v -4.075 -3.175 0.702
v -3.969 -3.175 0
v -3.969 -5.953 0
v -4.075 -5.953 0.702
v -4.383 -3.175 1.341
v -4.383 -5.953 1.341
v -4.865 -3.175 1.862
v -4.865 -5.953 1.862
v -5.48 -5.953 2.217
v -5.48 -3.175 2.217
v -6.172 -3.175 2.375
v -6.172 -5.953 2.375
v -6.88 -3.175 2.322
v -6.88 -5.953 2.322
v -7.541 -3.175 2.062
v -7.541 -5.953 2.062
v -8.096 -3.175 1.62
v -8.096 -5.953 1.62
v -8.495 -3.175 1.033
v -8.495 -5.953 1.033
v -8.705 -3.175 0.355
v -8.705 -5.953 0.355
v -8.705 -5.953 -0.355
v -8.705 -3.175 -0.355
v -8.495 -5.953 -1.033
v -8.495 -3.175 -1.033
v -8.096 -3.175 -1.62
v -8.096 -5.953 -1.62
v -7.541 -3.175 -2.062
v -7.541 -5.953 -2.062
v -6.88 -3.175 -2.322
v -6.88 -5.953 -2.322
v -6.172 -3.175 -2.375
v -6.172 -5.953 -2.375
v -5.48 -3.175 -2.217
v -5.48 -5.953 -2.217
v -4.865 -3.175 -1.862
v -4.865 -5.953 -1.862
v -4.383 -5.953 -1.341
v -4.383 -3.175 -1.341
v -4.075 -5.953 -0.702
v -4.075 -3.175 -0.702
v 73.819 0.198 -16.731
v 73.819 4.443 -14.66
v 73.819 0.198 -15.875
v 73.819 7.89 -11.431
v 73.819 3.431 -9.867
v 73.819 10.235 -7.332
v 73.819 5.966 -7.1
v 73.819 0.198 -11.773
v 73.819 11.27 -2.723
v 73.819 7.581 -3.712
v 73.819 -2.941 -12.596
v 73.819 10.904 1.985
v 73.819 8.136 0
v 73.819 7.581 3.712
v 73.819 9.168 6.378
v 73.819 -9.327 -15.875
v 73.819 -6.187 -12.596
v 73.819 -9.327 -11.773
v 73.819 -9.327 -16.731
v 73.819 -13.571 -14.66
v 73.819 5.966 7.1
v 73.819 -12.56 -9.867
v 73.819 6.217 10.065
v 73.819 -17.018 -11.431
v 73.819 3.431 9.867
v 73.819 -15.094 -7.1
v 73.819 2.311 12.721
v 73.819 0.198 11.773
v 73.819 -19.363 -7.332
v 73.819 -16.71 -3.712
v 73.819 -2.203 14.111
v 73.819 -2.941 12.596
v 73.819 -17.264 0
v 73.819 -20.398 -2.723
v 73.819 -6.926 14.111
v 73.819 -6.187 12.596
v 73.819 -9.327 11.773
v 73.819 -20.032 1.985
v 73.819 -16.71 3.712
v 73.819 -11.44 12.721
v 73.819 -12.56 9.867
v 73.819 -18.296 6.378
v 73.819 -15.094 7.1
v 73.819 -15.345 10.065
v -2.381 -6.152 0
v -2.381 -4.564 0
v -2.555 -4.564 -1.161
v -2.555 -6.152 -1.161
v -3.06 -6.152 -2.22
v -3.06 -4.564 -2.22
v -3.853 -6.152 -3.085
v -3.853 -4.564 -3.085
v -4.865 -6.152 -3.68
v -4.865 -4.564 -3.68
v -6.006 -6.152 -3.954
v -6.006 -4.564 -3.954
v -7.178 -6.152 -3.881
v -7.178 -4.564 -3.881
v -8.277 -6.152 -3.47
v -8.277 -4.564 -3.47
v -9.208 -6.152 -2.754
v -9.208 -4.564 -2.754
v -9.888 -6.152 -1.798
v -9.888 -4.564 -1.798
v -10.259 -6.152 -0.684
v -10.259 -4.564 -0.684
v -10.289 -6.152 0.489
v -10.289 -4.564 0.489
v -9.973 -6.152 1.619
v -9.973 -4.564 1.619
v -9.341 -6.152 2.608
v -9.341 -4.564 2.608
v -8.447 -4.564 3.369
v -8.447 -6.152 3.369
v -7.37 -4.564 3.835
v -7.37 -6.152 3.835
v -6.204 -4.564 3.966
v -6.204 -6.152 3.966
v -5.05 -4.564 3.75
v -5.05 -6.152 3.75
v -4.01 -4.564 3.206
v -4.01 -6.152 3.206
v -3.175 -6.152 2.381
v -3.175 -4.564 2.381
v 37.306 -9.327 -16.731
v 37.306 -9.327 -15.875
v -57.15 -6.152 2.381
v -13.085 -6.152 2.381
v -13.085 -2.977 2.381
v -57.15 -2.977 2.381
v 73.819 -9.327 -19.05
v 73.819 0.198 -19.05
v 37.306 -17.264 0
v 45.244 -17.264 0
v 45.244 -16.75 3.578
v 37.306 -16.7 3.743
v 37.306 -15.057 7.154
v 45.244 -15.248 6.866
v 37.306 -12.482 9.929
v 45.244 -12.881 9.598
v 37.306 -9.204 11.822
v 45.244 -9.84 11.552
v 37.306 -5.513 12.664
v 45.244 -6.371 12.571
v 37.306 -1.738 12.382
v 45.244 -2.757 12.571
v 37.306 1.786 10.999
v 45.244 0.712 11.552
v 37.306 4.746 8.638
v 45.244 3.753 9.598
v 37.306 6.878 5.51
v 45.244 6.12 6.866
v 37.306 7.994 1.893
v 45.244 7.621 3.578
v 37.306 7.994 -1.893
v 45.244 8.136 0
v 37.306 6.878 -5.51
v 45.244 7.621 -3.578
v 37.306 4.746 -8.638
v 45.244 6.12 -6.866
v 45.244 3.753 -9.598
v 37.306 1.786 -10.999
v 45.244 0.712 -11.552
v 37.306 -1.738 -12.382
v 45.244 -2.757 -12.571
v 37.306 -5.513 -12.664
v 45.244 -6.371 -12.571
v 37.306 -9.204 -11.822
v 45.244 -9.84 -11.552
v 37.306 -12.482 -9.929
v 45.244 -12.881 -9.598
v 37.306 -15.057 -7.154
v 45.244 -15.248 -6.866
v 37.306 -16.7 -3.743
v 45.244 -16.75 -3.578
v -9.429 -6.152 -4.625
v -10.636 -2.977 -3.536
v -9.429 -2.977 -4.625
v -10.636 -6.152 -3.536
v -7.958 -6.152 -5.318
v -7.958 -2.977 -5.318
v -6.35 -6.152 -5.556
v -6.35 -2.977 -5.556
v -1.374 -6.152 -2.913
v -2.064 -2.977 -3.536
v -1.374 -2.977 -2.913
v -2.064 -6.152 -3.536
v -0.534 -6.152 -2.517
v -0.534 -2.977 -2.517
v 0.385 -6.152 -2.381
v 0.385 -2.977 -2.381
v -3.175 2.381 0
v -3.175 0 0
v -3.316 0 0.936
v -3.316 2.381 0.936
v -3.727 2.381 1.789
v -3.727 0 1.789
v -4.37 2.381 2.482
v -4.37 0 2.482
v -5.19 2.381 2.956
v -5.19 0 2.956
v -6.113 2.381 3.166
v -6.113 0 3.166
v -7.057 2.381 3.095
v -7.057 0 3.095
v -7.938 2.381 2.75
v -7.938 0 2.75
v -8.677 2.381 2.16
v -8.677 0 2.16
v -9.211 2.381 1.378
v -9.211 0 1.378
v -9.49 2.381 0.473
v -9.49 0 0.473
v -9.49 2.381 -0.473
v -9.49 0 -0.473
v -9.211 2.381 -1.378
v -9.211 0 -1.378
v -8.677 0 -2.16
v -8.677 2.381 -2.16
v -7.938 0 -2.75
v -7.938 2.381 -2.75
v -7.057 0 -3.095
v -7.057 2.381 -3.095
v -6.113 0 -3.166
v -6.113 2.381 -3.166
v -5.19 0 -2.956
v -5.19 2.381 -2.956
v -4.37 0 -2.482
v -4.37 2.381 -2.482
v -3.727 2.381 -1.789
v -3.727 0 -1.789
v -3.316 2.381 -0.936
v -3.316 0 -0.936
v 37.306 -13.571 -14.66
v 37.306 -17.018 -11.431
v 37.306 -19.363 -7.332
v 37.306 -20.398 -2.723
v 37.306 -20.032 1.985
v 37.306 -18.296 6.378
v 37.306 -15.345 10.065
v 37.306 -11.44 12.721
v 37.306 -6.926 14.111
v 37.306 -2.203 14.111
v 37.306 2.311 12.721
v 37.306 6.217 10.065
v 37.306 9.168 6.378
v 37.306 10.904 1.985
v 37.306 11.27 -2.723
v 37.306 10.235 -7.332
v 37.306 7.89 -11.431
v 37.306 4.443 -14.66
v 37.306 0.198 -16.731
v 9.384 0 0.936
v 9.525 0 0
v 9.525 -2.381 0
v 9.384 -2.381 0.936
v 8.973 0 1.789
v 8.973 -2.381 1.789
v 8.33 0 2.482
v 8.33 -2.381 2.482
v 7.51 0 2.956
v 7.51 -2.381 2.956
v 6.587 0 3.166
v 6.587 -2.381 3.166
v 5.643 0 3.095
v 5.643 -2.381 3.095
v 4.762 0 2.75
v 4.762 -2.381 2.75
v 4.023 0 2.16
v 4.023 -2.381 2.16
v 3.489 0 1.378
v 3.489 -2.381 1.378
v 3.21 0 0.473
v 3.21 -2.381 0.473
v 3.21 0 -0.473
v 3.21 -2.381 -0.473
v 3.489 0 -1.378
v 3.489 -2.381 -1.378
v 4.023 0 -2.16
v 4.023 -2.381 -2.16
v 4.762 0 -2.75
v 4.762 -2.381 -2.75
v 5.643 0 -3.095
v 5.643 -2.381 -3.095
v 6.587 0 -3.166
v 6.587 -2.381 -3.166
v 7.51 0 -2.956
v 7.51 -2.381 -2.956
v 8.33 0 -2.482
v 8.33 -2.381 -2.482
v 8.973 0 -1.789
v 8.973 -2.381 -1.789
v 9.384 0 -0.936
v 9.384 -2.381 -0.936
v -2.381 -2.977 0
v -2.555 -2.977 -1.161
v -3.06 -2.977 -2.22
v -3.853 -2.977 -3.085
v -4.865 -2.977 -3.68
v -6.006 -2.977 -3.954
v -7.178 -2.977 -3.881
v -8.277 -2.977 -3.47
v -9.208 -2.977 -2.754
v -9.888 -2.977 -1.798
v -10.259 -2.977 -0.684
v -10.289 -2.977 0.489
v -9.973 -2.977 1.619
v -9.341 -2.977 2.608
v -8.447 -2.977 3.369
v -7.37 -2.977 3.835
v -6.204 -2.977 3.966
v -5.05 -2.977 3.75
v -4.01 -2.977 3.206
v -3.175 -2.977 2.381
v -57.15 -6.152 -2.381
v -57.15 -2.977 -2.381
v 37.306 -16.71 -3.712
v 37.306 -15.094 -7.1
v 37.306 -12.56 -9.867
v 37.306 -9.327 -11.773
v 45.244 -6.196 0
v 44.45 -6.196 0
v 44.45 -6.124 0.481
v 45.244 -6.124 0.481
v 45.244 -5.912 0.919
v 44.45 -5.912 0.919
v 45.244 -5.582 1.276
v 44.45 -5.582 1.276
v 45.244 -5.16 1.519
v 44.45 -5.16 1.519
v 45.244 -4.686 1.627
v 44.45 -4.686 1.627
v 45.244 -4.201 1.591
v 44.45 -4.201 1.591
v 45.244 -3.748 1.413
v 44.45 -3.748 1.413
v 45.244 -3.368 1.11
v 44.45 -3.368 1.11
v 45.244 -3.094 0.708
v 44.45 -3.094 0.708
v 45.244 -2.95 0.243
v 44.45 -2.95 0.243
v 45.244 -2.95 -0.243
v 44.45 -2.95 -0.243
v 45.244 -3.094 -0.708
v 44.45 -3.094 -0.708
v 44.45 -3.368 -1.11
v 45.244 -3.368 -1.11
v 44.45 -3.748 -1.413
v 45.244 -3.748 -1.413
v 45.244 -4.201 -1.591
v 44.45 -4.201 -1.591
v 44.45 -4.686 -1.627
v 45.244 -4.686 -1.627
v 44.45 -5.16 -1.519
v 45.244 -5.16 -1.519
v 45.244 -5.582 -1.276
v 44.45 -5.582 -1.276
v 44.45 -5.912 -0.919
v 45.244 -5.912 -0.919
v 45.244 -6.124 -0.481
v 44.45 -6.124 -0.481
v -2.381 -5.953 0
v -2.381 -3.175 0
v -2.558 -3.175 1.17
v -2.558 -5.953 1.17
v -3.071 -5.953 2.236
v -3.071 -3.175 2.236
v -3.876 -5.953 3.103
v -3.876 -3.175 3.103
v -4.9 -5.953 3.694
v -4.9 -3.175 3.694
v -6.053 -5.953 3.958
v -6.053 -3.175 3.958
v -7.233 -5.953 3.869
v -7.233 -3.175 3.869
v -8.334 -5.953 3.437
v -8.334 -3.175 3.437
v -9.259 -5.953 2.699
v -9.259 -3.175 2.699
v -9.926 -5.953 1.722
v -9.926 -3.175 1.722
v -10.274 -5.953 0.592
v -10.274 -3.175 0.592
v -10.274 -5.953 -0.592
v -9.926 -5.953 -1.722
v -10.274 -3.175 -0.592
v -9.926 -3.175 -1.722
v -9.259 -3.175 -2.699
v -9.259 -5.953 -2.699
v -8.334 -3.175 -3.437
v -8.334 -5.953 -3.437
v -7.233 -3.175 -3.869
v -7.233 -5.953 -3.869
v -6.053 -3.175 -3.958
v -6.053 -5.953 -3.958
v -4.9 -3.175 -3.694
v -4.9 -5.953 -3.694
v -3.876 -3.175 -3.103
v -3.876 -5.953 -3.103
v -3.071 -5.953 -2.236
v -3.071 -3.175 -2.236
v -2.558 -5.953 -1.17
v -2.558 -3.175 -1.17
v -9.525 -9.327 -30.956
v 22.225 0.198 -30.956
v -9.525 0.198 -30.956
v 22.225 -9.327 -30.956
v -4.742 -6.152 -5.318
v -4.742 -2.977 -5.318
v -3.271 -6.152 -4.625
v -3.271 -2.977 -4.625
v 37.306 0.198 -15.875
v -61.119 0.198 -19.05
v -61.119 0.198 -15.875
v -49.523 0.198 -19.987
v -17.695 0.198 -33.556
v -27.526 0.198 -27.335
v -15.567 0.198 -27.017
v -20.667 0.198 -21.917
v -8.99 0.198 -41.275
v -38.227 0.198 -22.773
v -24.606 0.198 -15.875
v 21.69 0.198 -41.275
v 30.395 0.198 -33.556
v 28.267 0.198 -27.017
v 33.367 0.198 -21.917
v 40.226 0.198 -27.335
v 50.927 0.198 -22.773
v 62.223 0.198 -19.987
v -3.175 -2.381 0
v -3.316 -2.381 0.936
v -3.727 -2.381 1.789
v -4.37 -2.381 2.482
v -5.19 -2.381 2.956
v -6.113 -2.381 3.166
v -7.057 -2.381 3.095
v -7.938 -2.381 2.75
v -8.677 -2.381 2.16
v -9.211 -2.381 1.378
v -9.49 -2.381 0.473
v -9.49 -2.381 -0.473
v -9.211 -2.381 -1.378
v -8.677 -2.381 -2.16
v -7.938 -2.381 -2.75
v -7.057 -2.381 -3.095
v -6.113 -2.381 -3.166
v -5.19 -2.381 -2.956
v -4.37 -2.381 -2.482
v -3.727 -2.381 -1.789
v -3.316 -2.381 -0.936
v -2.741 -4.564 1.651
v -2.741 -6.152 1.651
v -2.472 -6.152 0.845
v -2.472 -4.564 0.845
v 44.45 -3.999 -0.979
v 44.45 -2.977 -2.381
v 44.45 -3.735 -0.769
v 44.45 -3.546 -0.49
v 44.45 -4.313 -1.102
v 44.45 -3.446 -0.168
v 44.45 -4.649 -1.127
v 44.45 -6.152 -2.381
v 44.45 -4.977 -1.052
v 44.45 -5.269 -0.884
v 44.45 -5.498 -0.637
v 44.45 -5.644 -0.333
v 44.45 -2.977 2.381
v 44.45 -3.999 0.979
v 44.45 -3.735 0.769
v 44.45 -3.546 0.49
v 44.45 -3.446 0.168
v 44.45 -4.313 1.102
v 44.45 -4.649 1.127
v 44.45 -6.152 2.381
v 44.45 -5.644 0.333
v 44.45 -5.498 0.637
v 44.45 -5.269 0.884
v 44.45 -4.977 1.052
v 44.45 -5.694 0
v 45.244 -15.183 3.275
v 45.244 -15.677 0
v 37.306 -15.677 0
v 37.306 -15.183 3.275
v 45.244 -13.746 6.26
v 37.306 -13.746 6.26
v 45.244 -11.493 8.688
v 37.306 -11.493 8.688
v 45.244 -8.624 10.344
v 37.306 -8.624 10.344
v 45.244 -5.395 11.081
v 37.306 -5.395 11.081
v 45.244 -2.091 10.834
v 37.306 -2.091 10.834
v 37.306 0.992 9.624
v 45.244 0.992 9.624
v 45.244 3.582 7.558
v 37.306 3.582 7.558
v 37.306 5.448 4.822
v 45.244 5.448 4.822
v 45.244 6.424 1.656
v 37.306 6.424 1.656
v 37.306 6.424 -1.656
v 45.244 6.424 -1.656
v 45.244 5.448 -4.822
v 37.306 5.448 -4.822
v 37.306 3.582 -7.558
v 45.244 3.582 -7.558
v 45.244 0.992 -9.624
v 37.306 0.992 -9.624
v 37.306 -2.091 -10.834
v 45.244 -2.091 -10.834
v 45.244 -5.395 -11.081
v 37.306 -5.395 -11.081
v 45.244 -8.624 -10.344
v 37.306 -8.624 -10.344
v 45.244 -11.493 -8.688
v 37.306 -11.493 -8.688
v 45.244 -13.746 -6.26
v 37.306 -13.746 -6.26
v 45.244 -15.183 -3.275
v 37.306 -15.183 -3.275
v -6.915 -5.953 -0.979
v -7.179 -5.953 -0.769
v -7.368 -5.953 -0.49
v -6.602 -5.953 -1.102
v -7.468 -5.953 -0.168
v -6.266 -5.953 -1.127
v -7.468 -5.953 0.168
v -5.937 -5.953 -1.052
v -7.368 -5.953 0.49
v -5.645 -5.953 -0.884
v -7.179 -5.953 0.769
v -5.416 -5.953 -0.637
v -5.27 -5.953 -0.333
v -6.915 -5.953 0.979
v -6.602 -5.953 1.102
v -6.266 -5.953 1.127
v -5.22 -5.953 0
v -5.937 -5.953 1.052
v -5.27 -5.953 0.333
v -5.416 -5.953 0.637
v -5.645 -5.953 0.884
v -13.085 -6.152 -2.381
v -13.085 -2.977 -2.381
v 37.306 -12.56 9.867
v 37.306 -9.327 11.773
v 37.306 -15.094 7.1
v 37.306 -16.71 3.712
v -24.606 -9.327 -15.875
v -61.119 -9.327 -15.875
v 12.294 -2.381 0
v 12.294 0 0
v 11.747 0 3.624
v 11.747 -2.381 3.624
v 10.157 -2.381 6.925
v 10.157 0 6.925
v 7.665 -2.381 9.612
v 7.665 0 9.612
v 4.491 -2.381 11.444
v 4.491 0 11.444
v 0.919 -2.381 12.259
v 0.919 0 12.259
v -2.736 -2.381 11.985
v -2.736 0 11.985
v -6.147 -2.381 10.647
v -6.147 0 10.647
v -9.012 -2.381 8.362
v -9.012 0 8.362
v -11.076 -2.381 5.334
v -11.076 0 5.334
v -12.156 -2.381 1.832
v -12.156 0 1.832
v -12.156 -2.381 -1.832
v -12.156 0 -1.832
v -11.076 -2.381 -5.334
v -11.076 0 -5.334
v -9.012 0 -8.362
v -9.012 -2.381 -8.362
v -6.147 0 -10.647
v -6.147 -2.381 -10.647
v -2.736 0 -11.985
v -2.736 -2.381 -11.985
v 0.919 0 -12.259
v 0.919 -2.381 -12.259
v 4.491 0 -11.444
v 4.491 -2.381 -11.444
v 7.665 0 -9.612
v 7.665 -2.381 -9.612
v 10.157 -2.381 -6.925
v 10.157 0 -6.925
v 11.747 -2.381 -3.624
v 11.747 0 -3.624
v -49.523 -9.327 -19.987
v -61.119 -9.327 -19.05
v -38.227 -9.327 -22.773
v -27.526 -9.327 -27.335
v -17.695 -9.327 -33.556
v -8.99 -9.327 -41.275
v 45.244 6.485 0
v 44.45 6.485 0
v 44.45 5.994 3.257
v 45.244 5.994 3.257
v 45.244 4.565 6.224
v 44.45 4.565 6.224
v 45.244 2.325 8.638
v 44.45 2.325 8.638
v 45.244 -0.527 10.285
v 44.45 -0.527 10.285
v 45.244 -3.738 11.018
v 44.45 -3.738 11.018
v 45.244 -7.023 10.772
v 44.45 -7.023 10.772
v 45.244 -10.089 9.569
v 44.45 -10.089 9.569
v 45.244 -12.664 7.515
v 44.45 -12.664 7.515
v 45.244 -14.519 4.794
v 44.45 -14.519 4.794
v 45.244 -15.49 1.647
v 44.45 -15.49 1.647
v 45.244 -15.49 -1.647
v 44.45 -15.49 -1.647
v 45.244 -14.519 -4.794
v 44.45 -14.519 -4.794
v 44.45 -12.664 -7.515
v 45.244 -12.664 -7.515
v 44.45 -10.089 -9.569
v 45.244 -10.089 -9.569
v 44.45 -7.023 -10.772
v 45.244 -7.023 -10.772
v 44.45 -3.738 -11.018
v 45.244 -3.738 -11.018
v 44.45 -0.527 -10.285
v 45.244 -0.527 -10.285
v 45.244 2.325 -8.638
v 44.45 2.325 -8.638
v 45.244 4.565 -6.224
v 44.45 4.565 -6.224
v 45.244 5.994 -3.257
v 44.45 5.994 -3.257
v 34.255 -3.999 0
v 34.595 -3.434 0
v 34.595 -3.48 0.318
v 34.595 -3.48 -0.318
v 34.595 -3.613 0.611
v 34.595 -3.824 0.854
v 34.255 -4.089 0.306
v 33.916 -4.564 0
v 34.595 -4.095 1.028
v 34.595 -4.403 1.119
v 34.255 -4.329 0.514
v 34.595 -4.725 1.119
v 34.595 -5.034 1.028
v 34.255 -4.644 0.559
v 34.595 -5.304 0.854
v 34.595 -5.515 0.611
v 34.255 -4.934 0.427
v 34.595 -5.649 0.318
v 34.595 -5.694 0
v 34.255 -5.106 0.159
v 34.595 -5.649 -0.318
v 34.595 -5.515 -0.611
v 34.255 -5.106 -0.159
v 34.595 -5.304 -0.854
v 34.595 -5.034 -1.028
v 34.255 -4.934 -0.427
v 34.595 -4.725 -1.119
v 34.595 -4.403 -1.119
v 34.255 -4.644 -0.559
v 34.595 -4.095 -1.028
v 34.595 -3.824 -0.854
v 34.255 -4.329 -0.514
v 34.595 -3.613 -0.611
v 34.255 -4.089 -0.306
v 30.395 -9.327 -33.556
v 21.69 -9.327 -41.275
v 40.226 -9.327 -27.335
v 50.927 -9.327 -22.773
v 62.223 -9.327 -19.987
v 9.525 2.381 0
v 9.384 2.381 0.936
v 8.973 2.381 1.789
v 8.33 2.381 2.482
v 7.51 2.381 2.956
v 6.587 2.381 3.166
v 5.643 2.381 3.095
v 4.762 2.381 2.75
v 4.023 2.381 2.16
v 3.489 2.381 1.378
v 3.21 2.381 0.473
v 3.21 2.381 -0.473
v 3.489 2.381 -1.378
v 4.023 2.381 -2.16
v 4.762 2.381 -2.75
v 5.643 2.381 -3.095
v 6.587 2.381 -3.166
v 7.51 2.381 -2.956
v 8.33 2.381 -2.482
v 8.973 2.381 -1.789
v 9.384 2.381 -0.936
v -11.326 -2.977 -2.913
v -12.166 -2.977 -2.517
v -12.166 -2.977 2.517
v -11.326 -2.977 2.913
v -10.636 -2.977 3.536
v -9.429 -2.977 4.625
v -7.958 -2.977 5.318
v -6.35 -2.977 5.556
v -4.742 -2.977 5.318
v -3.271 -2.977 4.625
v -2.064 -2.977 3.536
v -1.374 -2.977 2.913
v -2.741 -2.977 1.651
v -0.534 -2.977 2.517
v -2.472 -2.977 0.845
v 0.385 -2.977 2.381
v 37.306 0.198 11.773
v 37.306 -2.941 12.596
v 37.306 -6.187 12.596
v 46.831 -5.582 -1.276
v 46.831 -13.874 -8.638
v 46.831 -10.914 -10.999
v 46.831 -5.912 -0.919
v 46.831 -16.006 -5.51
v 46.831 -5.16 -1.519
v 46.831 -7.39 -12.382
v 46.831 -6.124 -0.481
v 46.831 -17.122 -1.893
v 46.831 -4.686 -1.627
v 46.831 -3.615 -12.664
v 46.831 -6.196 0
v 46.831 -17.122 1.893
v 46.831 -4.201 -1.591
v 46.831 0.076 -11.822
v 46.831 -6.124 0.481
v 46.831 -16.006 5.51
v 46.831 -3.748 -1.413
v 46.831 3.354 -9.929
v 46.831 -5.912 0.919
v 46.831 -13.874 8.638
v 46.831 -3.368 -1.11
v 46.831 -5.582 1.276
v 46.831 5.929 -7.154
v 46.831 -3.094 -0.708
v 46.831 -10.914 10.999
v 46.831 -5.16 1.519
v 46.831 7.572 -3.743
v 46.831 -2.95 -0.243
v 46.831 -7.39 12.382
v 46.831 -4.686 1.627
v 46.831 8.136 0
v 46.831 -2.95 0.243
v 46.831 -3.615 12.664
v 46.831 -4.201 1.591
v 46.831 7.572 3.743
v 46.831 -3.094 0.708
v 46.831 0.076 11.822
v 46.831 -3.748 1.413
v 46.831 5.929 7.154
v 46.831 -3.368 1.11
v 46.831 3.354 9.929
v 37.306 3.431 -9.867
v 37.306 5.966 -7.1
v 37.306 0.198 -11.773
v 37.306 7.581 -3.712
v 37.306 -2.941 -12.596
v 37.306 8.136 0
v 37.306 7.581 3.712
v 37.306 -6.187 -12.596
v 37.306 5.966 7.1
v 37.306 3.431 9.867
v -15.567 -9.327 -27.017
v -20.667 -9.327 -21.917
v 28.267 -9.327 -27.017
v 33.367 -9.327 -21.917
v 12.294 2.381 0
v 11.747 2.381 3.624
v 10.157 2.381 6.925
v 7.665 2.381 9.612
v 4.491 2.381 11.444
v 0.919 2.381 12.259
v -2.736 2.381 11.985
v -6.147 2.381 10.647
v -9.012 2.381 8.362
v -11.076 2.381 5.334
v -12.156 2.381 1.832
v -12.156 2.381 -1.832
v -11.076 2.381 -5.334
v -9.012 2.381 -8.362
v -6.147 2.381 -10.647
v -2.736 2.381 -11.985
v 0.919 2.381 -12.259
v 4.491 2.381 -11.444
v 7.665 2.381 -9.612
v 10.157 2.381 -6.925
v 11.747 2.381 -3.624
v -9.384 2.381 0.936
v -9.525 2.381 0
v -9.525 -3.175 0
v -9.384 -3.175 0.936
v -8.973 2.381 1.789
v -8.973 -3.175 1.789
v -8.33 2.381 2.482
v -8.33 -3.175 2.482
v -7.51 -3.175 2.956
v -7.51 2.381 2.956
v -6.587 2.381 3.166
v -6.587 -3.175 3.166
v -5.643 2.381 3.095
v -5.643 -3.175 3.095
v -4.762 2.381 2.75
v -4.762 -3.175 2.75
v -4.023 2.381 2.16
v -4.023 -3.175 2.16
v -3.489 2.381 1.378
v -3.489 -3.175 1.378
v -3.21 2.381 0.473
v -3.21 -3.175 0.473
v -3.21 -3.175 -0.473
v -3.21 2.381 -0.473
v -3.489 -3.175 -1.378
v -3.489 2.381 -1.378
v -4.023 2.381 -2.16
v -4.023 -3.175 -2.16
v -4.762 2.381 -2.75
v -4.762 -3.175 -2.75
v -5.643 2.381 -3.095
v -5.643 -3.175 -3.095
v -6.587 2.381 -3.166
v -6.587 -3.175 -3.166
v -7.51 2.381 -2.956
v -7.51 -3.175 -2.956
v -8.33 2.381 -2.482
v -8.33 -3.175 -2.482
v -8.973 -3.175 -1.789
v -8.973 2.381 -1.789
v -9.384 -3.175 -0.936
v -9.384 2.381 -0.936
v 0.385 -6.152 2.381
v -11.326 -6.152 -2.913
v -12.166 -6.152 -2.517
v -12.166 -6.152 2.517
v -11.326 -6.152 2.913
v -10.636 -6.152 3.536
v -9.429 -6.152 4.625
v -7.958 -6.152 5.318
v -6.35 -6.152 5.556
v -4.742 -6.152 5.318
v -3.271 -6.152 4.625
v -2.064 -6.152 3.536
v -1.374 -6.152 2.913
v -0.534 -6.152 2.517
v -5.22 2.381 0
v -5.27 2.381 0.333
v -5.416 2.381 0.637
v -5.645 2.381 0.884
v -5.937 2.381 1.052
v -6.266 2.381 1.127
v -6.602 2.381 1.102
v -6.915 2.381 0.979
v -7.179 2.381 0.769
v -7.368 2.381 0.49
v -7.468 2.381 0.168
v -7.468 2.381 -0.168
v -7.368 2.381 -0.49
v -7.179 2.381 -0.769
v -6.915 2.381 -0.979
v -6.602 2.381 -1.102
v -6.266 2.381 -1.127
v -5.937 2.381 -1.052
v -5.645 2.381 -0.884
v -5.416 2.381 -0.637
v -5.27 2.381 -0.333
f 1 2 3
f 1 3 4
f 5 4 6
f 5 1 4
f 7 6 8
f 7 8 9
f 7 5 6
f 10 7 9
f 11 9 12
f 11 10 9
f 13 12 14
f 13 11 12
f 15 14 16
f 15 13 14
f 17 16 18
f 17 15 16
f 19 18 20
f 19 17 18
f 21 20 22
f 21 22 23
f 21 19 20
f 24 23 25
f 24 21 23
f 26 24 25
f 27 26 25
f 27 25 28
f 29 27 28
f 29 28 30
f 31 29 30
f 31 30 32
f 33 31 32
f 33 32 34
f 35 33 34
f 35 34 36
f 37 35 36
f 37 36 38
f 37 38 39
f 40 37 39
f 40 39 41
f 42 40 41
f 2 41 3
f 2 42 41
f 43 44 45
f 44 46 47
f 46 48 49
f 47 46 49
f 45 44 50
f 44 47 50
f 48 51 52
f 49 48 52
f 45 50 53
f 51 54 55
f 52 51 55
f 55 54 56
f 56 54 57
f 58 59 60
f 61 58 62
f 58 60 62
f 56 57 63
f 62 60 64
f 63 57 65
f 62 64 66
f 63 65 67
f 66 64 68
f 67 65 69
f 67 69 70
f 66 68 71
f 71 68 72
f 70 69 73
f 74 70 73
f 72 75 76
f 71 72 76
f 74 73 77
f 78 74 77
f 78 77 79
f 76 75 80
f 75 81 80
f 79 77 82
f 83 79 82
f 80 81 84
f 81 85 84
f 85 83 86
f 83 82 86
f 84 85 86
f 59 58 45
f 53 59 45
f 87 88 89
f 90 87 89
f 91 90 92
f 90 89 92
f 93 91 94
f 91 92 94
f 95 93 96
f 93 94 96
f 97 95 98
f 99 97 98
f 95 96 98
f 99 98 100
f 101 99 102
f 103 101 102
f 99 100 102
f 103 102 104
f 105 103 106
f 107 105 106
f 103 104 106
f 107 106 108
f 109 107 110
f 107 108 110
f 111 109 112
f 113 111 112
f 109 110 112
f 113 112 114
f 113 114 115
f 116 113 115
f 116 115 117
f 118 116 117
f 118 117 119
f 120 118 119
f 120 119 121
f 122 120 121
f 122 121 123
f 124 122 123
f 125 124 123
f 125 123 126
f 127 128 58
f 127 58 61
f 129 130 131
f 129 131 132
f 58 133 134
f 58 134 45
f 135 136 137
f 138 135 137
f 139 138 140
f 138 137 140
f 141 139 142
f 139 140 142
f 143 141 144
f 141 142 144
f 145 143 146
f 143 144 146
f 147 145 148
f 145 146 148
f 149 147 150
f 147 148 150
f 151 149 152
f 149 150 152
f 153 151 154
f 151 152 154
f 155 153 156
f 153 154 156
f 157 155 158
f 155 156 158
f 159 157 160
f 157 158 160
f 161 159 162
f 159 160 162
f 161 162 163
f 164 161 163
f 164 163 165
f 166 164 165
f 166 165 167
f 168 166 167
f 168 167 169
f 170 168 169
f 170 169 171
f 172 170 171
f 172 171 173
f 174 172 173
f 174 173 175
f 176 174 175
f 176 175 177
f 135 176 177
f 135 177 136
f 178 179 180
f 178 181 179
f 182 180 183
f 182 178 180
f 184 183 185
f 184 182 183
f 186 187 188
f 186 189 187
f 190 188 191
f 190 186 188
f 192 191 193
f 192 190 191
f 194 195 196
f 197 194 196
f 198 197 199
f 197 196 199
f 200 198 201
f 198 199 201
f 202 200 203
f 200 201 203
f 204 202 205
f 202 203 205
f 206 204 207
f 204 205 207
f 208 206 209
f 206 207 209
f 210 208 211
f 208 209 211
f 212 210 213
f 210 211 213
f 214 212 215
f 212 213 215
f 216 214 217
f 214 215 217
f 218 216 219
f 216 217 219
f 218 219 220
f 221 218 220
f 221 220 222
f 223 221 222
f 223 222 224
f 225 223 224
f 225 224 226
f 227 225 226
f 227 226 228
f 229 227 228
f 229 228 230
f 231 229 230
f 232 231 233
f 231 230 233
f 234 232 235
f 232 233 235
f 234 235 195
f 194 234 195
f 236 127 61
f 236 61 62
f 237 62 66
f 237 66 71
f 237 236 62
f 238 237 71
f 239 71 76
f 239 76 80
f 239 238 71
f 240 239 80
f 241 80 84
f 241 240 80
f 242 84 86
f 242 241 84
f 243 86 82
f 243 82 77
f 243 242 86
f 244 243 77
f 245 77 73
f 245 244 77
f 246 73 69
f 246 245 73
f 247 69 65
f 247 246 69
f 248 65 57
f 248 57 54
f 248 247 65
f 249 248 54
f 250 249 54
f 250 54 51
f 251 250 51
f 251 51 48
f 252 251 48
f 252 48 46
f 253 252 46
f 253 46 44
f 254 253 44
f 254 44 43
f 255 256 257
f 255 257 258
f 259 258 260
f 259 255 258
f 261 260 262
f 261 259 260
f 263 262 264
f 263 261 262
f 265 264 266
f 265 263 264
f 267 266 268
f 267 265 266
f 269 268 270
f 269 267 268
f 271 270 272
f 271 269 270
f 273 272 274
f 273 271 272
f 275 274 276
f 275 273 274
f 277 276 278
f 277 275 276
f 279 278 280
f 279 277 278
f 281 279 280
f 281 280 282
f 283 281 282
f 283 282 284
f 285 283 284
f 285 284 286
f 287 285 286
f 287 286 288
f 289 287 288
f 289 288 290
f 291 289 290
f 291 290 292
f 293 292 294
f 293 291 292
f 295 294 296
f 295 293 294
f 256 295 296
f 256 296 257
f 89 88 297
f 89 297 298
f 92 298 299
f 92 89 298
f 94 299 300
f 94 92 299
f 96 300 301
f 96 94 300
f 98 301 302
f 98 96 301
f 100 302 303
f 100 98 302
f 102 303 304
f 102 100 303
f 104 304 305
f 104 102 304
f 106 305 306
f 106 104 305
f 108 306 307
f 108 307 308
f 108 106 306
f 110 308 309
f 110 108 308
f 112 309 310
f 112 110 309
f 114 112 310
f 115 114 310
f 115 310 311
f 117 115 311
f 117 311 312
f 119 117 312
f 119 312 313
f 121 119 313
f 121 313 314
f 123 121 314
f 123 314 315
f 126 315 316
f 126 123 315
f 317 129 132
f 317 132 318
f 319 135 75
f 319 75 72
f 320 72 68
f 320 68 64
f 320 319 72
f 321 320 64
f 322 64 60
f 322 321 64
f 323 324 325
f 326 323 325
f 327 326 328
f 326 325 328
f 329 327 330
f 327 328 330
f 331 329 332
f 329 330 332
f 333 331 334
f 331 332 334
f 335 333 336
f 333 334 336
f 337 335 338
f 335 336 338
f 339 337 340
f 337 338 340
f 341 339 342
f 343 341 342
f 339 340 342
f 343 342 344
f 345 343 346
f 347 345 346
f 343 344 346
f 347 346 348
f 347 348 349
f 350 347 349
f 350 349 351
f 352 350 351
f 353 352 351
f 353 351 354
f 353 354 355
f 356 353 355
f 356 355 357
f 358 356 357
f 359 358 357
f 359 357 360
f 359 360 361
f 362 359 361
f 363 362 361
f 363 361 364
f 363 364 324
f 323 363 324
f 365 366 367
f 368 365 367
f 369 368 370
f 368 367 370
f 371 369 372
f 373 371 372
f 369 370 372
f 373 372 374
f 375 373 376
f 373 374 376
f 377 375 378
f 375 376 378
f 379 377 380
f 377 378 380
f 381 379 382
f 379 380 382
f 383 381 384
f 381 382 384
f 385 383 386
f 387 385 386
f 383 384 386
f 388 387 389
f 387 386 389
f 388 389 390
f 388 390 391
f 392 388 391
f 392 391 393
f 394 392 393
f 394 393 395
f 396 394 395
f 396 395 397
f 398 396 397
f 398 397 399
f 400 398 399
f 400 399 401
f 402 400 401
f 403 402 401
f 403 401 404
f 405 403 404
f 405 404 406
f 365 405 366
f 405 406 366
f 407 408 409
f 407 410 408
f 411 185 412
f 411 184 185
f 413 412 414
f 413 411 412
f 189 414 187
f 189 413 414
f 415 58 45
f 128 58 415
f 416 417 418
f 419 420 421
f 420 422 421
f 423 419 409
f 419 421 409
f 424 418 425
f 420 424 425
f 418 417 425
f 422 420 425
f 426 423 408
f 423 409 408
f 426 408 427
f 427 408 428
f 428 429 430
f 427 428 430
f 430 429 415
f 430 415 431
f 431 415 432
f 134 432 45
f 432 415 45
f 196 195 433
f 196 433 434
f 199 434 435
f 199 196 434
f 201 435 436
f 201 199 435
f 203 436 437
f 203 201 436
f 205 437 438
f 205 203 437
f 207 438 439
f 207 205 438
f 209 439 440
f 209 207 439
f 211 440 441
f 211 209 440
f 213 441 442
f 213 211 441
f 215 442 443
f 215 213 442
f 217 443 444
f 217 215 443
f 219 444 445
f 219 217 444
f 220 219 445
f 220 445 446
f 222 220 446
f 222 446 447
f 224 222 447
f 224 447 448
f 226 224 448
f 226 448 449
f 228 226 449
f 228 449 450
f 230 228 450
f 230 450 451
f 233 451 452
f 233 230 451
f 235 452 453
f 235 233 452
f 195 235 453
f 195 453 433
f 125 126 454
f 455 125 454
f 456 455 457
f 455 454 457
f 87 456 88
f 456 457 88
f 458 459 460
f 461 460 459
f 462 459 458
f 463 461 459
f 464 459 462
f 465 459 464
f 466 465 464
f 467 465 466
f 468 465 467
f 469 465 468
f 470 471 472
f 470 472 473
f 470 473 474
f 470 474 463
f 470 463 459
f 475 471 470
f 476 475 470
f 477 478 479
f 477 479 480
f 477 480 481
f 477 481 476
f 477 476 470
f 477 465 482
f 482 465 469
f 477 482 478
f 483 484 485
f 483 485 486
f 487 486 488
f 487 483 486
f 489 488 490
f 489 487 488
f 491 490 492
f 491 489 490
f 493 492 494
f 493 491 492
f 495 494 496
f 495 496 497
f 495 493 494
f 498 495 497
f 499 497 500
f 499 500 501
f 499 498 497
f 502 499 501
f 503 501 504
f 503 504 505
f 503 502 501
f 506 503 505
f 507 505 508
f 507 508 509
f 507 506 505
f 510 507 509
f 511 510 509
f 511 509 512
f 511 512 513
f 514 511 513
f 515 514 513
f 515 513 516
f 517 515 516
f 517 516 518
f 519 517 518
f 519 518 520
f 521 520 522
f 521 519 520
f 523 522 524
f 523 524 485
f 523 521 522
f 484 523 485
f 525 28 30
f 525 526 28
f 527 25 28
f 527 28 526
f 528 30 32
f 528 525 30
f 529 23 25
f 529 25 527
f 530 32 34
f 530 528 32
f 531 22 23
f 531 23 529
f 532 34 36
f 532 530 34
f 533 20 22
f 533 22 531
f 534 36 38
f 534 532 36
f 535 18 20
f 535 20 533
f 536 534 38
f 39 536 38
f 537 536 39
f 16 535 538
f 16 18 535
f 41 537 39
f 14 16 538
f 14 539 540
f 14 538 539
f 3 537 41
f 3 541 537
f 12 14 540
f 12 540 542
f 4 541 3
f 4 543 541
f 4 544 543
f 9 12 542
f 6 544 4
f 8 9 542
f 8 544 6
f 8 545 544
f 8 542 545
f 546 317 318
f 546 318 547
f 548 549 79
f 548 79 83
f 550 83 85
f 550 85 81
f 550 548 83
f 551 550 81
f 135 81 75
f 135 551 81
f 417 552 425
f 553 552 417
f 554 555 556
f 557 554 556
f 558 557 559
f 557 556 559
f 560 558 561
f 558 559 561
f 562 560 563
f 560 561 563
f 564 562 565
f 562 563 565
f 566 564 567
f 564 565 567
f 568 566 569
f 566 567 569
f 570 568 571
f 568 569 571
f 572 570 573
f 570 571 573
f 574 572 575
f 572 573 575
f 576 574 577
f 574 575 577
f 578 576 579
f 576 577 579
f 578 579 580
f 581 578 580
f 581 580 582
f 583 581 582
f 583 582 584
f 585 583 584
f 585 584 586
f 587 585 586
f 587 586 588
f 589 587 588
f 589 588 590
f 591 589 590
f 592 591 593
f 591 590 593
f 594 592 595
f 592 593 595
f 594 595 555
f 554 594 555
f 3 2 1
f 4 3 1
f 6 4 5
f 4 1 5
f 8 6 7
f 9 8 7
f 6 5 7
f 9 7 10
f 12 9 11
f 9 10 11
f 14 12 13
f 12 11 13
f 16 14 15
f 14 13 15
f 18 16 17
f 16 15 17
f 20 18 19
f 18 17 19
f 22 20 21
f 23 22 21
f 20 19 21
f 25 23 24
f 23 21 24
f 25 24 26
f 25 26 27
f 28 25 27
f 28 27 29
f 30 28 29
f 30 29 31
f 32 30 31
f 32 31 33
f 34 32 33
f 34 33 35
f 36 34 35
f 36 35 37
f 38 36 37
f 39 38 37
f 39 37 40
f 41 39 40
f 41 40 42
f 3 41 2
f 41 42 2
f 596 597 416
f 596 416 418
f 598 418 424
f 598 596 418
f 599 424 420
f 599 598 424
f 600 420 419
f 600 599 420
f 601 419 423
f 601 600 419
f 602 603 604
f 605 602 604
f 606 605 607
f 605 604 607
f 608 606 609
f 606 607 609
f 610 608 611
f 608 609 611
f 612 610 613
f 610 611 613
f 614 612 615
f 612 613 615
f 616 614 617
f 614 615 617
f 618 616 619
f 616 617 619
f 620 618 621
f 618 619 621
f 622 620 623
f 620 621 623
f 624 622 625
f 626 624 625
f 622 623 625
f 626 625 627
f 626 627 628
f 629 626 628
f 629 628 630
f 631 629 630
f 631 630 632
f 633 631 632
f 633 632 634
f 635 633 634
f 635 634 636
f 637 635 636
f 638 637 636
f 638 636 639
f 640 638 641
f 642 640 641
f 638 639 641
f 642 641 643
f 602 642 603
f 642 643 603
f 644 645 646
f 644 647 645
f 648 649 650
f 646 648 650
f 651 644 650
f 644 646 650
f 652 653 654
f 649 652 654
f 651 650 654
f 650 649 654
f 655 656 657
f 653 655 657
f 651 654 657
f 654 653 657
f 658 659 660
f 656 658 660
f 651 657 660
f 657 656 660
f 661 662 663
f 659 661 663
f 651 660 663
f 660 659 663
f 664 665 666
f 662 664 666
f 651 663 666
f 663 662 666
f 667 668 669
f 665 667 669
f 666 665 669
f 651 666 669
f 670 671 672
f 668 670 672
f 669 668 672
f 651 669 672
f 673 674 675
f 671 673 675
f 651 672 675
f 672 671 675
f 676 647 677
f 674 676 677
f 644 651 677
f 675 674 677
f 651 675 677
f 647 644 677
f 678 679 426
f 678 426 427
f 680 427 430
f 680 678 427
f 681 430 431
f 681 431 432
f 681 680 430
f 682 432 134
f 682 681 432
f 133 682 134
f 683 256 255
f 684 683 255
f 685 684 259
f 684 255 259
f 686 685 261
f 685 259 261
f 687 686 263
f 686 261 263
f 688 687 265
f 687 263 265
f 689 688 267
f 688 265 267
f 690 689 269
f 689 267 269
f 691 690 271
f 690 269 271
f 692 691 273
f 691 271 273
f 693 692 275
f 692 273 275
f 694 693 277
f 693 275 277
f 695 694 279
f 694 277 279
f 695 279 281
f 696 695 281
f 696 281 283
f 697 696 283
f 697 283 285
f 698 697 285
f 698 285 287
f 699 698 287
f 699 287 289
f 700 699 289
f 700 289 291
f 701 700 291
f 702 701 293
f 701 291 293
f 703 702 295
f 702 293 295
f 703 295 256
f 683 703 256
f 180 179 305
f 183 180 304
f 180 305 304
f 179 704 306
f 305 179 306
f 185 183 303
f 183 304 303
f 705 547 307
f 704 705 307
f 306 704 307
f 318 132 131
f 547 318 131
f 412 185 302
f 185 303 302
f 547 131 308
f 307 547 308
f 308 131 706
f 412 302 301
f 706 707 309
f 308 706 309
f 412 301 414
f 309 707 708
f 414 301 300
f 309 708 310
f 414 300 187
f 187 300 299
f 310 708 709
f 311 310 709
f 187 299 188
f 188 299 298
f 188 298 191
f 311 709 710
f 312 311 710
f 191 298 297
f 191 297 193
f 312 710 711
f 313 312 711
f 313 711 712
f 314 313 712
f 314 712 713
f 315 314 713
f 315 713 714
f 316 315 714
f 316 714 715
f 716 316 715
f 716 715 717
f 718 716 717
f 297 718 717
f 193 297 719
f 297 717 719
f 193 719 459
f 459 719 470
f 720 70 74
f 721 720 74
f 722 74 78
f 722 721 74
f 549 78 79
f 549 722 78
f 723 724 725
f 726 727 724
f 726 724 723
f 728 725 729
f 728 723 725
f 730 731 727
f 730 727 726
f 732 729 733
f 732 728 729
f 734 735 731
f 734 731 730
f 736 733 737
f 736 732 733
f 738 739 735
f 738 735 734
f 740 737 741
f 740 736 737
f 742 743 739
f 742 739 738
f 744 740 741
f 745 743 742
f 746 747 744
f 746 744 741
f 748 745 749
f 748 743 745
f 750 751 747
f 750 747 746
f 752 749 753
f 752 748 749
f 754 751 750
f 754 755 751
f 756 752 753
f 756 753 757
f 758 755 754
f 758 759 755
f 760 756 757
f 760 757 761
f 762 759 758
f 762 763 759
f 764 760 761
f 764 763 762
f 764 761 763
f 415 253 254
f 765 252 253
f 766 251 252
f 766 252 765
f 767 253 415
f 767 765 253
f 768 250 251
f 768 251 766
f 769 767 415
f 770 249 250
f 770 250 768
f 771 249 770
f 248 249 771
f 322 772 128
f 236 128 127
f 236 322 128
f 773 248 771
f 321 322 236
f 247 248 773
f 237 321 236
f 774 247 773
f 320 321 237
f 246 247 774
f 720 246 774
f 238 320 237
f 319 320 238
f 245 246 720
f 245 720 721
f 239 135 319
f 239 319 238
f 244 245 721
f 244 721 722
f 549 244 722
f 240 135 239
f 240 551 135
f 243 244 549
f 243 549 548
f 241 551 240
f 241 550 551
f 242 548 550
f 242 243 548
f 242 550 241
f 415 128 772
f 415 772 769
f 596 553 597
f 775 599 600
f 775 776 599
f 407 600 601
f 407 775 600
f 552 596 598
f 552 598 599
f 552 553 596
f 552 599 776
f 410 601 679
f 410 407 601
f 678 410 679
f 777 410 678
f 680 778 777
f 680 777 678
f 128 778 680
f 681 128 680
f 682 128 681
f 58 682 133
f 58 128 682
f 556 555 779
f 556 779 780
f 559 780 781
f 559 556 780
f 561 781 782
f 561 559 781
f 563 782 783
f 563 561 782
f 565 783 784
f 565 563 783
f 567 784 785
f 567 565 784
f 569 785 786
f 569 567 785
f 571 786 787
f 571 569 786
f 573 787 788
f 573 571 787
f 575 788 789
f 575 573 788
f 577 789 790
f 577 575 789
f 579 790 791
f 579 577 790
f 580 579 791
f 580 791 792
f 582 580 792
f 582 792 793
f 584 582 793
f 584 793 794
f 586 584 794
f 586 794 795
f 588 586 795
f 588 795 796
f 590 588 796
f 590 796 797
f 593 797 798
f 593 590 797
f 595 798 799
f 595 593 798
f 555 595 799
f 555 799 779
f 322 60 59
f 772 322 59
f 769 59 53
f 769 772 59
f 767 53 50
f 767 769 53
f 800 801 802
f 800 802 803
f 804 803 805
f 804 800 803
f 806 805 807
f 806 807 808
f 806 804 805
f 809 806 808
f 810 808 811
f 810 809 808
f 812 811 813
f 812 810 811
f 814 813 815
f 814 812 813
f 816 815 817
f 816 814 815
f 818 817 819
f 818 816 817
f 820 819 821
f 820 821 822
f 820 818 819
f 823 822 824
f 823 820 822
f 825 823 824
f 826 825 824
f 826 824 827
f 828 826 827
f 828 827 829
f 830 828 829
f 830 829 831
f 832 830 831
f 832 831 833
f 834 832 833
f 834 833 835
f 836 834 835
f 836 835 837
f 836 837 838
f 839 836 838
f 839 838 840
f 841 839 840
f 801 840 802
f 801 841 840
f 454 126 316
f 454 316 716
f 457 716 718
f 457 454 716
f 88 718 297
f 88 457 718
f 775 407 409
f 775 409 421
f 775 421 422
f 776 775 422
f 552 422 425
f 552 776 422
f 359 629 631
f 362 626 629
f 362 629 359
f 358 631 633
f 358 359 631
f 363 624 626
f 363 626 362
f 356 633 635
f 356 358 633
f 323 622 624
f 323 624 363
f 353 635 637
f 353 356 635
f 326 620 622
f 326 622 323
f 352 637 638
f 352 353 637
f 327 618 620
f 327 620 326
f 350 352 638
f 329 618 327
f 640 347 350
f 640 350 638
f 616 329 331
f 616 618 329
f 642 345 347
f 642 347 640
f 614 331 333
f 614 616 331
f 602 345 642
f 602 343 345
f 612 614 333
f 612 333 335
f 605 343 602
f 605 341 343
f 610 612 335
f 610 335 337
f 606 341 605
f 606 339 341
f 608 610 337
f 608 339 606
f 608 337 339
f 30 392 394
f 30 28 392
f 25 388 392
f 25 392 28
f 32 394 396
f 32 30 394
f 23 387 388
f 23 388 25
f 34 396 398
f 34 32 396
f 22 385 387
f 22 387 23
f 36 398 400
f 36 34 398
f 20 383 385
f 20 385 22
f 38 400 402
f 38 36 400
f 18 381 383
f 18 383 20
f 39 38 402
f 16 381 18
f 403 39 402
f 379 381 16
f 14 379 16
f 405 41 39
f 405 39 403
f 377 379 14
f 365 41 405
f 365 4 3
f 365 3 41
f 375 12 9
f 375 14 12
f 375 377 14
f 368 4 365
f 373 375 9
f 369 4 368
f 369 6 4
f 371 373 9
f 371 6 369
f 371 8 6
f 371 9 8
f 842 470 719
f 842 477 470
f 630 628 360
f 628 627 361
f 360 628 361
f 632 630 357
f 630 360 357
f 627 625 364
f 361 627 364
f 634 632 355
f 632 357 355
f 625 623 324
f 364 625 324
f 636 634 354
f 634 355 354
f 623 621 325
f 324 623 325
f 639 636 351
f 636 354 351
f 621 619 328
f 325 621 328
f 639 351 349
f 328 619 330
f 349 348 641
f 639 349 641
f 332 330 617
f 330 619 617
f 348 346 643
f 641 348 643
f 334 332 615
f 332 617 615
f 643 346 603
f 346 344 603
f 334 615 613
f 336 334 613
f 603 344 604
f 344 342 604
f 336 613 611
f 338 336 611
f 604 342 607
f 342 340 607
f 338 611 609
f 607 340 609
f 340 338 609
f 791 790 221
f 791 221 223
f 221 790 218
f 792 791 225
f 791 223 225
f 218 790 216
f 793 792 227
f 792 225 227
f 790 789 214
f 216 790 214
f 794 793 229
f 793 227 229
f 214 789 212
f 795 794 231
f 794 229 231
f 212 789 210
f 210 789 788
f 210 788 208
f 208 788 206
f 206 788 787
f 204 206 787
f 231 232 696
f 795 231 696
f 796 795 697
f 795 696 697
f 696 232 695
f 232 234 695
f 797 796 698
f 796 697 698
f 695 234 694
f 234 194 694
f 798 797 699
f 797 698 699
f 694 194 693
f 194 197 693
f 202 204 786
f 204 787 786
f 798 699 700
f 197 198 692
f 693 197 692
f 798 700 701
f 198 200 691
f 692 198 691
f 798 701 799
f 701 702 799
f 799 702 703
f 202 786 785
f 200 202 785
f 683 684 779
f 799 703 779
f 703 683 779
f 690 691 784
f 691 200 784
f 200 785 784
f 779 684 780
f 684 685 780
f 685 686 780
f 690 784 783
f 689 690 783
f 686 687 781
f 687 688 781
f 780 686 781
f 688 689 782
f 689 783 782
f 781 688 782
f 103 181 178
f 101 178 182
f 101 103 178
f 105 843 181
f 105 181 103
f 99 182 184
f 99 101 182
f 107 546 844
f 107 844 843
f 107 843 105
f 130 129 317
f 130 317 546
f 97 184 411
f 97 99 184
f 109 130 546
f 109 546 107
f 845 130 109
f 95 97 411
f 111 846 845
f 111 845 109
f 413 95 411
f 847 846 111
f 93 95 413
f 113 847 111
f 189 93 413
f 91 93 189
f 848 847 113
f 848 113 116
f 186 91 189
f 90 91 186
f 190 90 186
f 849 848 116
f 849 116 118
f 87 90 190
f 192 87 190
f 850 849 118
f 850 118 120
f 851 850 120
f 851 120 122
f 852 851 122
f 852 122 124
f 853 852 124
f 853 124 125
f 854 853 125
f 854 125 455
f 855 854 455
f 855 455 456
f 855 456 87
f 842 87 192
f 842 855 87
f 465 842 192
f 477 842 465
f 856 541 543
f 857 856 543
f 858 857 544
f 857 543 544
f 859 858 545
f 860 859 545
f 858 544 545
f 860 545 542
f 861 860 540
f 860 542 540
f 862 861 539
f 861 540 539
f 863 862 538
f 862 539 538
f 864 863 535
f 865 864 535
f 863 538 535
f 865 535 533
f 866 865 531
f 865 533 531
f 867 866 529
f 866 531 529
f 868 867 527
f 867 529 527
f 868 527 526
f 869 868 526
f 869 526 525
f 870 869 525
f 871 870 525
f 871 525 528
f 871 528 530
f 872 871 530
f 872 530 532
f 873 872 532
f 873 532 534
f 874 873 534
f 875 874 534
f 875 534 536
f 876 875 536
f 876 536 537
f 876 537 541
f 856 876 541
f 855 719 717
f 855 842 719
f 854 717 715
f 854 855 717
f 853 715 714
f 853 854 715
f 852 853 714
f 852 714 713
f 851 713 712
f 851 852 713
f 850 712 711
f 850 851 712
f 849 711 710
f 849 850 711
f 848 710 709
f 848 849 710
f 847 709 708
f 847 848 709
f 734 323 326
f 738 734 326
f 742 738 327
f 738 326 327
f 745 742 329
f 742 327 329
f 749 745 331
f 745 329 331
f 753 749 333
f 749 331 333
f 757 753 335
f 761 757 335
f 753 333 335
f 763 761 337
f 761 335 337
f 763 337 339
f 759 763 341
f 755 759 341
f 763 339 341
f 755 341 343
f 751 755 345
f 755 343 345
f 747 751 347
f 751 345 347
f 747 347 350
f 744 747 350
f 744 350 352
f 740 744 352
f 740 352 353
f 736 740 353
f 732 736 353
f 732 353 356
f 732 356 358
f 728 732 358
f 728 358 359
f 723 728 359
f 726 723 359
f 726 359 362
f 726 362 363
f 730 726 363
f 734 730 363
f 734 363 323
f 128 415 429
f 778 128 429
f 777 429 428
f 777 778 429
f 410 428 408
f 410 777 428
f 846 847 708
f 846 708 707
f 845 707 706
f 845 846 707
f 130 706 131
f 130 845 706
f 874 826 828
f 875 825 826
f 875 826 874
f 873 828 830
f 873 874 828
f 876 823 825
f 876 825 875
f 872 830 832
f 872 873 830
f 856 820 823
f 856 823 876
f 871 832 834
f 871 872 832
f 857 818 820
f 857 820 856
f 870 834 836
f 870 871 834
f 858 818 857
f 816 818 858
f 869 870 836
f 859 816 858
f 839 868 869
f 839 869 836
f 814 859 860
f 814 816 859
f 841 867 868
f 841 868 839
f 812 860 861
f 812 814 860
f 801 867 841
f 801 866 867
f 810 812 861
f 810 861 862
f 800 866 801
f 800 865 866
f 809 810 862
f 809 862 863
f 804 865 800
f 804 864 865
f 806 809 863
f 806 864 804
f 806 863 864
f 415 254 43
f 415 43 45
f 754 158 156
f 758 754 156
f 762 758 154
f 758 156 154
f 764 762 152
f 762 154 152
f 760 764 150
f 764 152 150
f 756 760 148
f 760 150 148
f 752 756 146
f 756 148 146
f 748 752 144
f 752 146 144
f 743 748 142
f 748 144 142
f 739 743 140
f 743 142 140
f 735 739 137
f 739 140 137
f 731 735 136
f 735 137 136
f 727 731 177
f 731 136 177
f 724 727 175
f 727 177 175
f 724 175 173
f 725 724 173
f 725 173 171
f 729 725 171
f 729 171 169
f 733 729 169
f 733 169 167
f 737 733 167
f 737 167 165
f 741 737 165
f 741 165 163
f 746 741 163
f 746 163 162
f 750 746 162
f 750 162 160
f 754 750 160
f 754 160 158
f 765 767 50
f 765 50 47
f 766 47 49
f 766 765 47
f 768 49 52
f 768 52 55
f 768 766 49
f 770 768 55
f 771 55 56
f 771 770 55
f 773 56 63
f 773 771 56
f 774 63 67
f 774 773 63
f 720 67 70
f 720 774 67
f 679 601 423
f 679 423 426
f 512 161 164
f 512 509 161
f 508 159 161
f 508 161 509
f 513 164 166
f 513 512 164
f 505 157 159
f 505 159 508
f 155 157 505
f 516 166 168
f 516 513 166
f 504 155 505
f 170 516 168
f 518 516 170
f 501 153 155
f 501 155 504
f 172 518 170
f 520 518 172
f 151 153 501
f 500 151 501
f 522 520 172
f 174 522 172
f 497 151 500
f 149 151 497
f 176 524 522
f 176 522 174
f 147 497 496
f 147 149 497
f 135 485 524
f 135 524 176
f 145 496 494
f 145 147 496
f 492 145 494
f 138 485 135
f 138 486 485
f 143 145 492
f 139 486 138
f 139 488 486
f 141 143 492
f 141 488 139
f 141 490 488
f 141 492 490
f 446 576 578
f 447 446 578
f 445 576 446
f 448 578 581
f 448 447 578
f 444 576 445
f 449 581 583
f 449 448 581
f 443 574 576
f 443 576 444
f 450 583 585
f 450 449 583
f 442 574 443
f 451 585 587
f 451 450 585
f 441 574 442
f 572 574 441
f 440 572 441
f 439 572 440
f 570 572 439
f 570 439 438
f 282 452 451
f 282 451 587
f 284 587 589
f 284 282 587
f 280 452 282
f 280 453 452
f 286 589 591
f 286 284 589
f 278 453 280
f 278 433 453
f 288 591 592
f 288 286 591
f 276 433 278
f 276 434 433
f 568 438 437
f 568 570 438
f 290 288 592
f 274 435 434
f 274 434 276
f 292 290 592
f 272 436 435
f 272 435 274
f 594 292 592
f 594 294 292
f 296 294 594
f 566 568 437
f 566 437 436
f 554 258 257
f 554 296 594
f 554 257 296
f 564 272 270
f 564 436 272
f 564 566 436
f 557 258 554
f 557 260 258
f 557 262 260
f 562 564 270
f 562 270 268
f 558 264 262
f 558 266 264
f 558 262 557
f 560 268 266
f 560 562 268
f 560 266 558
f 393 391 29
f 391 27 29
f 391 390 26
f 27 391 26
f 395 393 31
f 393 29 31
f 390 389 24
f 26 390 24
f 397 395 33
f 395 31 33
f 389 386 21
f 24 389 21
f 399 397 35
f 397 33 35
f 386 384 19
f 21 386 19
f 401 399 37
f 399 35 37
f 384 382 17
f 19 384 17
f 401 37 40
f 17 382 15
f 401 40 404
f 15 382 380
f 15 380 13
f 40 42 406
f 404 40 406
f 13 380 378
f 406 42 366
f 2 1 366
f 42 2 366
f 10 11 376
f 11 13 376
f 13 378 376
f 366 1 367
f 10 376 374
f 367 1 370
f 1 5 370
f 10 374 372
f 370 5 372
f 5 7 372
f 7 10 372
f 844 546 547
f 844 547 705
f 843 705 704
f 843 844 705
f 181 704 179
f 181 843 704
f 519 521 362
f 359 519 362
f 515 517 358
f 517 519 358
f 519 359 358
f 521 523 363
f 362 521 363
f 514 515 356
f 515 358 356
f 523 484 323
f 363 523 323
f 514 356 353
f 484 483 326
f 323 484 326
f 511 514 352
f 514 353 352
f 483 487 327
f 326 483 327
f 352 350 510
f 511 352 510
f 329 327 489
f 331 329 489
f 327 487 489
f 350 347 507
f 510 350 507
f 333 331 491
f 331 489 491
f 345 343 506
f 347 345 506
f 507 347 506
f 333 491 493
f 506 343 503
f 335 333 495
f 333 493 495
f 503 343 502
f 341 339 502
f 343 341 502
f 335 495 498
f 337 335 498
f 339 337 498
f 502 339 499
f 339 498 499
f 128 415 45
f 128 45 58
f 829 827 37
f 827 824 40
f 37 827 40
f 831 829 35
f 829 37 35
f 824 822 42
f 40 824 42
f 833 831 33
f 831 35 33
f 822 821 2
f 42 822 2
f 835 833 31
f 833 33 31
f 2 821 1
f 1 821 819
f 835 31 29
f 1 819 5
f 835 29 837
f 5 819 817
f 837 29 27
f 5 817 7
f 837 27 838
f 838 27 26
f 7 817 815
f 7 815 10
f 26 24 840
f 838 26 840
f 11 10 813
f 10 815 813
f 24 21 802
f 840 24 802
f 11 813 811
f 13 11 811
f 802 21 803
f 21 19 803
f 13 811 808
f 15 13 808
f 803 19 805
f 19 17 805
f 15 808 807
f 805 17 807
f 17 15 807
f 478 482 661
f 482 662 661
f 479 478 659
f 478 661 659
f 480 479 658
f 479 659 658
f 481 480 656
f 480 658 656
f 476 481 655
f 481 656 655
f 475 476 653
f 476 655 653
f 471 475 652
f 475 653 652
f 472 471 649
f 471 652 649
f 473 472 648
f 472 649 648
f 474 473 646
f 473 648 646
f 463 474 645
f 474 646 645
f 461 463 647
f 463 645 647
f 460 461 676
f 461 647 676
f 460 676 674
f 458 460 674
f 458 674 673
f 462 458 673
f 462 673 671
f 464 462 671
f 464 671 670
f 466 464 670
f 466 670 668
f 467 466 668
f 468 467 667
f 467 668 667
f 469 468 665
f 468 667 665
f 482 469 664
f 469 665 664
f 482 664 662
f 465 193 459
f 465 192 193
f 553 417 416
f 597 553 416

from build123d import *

# Parameters (mm, degrees)
F0_R           = 12.2936
F0_R_2         = 3.175
F1_DEPTH       = 2.38125
F1_DEPTH_BACK  = 2.38125
F2_R           = 3.175
F3_DEPTH       = 5.55625
F4_R           = 2.38125
F5_DEPTH       = 2.778125
F7_D           = 2.2606
F8_R           = 3.96875
F8_R_2         = 2.38125
F9_DEPTH       = 2.778125
F12_DEPTH      = 1.5875
F12_DEPTH_BACK = 1.5875
F14_D          = 2.2606
F14_DEPTH      = 9.8552
F14_TIP        = 0.6791527577
F15_R          = 11.049
F16_DEPTH      = 0.79375
F17_R          = 12.7
F18_DEPTH      = 1.5875
F20_D          = 3.2639
F20_2_D        = 3.2639
F21_R          = 12.7
F21_R_2        = 11.1125
F22_DEPTH      = 7.9375
F24_DEPTH      = 36.5125
F27_DEPTH      = 4.7625
F27_DEPTH_BACK = 4.7625


with BuildPart() as f1:
    # F0 (on Front) → F1 (new body, two sides)
    with BuildSketch(Plane.XZ) as f1_sk:
        Circle(F0_R)
        with Locations((-6.35, 0)):
            Circle(F0_R_2, mode=Mode.SUBTRACT)
        with Locations((6.35, 0)):
            Circle(F0_R_2, mode=Mode.SUBTRACT)
    extrude(amount=-F1_DEPTH)
    extrude(f1_sk.sketch, amount=F1_DEPTH_BACK)


with BuildPart() as f3:
    # F2 (on face) → F3 (new body)
    with BuildSketch(Plane(origin=(0, 2.38125, 0), x_dir=(-1, 0, 0), z_dir=(0, 1, 0))):
        with Locations((6.35, 0)):
            Circle(F2_R)
    extrude(amount=-F3_DEPTH)

    # F4 (on face) → F5 (join)
    with BuildSketch(Plane.XZ.offset(3.175)):
        with Locations((-6.35, 0)):
            Circle(F4_R)
    extrude(amount=F5_DEPTH)

    # F7 (through all)
    with Locations(Plane(origin=(0, 2.38125, 0), x_dir=(-1, 0, 0), z_dir=(0, 1, 0))):
        with Locations((6.35, 0)):
            Hole(F7_D / 2)


with BuildPart() as f9:
    # F8 (on face) → F9 (new body)
    with BuildSketch(Plane.XZ.offset(3.175)):
        with Locations((-6.35, 0)):
            Circle(F8_R)
        with Locations((-6.35, 0)):
            Circle(F8_R_2, mode=Mode.SUBTRACT)
    extrude(amount=F9_DEPTH)


with BuildPart() as f12:
    # F11 (on offset) → F12 (new body, two sides)
    with BuildSketch(Plane.XZ.offset(4.5640625)) as f12_sk:
        with BuildLine():
            ThreePointArc((0.3851920908, 2.38125), (-0.9686324581, 2.6843544429), (-2.0639686695, 3.5357954545))
            ThreePointArc((-2.0639686695, 3.5357954545), (-3.9808070395, 5.0258172249), (-6.35, 5.55625))
            ThreePointArc((-6.35, 5.55625), (-8.7191929605, 5.0258172249), (-10.6360313305, 3.5357954545))
            ThreePointArc((-10.6360313305, 3.5357954545), (-11.7313675419, 2.6843544429), (-13.0851920908, 2.38125))
            Line((-13.0851920908, 2.38125), (-57.15, 2.38125))
            Line((-57.15, 2.38125), (-57.15, -2.38125))
            Line((-57.15, -2.38125), (-13.0851920908, -2.38125))
            ThreePointArc((-13.0851920908, -2.38125), (-11.7313675419, -2.6843544429), (-10.6360313305, -3.5357954545))
            ThreePointArc((-10.6360313305, -3.5357954545), (-8.7191929605, -5.0258172249), (-6.35, -5.55625))
            ThreePointArc((-6.35, -5.55625), (-3.9808070395, -5.0258172249), (-2.0639686695, -3.5357954545))
            ThreePointArc((-2.0639686695, -3.5357954545), (-0.9686324581, -2.6843544429), (0.3851920908, -2.38125))
            Line((0.3851920908, -2.38125), (44.45, -2.38125))
            Line((44.45, -2.38125), (44.45, 2.38125))
            Line((44.45, 2.38125), (0.3851920908, 2.38125))
        make_face()
        with BuildLine():
            ThreePointArc((-3.175, 2.38125), (-2.5849131609, 1.2550289464), (-2.38125, 0))
            ThreePointArc((-2.38125, 0), (-10.1150868391, -1.2550289464), (-3.175, 2.38125))
        make_face(mode=Mode.SUBTRACT)
    extrude(amount=F12_DEPTH)
    extrude(f12_sk.sketch, amount=-F12_DEPTH_BACK)

    # F14
    with Locations(Plane.YZ.offset(44.45)):
        with Locations((-4.5640625, 0)):
            Hole(F14_D / 2, depth=F14_DEPTH)
            with Locations((0, 0, -(F14_DEPTH + F14_TIP / 2))):  # 118° drill point
                Cone(0, F14_D / 2, F14_TIP, mode=Mode.SUBTRACT)


with BuildPart() as f16:
    # F15 (on face) → F16 (new body)
    with BuildSketch(Plane.YZ.offset(44.45)):
        with Locations((-4.5640625, 0)):
            Circle(F15_R)
    extrude(amount=F16_DEPTH)

    # F20 (through all)
    with Locations(Plane.YZ.offset(46.83125)):
        with Locations((-4.5640625, 0)):
            Hole(F20_D / 2)


with BuildPart() as f18:
    # F17 (on face) → F18 (new body)
    with BuildSketch(Plane.YZ.offset(45.24375)):
        with Locations((-4.5640625, 0)):
            Circle(F17_R)
    extrude(amount=F18_DEPTH)

    # F20#2 (through all)
    with Locations(Plane.YZ.offset(46.83125)):
        with Locations((-4.5640625, 0)):
            Hole(F20_2_D / 2)

    # F21 (on face) → F22 (join)
    with BuildSketch(Plane(origin=(45.24375, 0, 0), x_dir=(0, -1, 0), z_dir=(-1, 0, 0))):
        with Locations((4.5640625, 0)):
            Circle(F21_R)
        with Locations((4.5640625, 0)):
            Circle(F21_R_2, mode=Mode.SUBTRACT)
    extrude(amount=F22_DEPTH)


with BuildPart() as f24:
    # F23 (on face) → F24 (new body)
    with BuildSketch(Plane(origin=(37.30625, 0, 0), x_dir=(0, -1, 0), z_dir=(-1, 0, 0))):
        with BuildLine():
            Line((9.3265625, -15.875), (9.3265625, -16.7312848225))
            ThreePointArc((9.3265625, -16.7312848225), (4.5640625, 14.2875), (-0.1984375, -16.7312848225))
            Line((-0.1984375, -16.7312848225), (-0.1984375, -15.875))
            Line((-0.1984375, -15.875), (9.3265625, -15.875))
        make_face()
        with BuildLine():
            ThreePointArc((9.3265625, 11.7732150983), (15.0943462094, 7.0995158286), (17.2640625, 0))
            ThreePointArc((17.2640625, 0), (15.0943462094, -7.0995158286), (9.3265625, -11.7732150983))
            ThreePointArc((9.3265625, -11.7732150983), (4.5640625, -12.7), (-0.1984375, -11.7732150983))
            ThreePointArc((-0.1984375, -11.7732150983), (-8.1359375, 0), (-0.1984375, 11.7732150983))
            ThreePointArc((-0.1984375, 11.7732150983), (4.5640625, 12.7), (9.3265625, 11.7732150983))
        make_face(mode=Mode.SUBTRACT)
    extrude(amount=-F24_DEPTH)


with BuildPart() as f27:
    # F26 (on offset) → F27 (new body, two sides)
    with BuildSketch(Plane.XZ.offset(4.5640625)) as f27_sk:
        with BuildLine():
            Line((22.225, -30.95625), (6.35, -30.95625))
            Line((6.35, -30.95625), (6.35, -41.275))
            Line((6.35, -41.275), (21.6904613597, -41.275))
            ThreePointArc((21.6904613597, -41.275), (45.4845431928, -24.8381142832), (73.81875, -19.05))
            Line((73.81875, -19.05), (73.81875, -15.875))
            Line((73.81875, -15.875), (37.30625, -15.875))
            ThreePointArc((37.30625, -15.875), (30.9498479575, -24.5998479575), (22.225, -30.95625))
        make_face()
        with BuildLine():
            Line((6.35, -41.275), (6.35, -30.95625))
            Line((6.35, -30.95625), (-9.525, -30.95625))
            ThreePointArc((-9.525, -30.95625), (-18.2498479575, -24.5998479575), (-24.60625, -15.875))
            Line((-24.60625, -15.875), (-61.11875, -15.875))
            Line((-61.11875, -15.875), (-61.11875, -19.05))
            ThreePointArc((-61.11875, -19.05), (-32.7845431928, -24.8381142832), (-8.9904613597, -41.275))
            Line((-8.9904613597, -41.275), (6.35, -41.275))
        make_face()
    extrude(amount=F27_DEPTH)
    extrude(f27_sk.sketch, amount=-F27_DEPTH_BACK)


solid = Compound([f1.part, f3.part, f9.part, f12.part, f16.part, f18.part, f24.part, f27.part])
